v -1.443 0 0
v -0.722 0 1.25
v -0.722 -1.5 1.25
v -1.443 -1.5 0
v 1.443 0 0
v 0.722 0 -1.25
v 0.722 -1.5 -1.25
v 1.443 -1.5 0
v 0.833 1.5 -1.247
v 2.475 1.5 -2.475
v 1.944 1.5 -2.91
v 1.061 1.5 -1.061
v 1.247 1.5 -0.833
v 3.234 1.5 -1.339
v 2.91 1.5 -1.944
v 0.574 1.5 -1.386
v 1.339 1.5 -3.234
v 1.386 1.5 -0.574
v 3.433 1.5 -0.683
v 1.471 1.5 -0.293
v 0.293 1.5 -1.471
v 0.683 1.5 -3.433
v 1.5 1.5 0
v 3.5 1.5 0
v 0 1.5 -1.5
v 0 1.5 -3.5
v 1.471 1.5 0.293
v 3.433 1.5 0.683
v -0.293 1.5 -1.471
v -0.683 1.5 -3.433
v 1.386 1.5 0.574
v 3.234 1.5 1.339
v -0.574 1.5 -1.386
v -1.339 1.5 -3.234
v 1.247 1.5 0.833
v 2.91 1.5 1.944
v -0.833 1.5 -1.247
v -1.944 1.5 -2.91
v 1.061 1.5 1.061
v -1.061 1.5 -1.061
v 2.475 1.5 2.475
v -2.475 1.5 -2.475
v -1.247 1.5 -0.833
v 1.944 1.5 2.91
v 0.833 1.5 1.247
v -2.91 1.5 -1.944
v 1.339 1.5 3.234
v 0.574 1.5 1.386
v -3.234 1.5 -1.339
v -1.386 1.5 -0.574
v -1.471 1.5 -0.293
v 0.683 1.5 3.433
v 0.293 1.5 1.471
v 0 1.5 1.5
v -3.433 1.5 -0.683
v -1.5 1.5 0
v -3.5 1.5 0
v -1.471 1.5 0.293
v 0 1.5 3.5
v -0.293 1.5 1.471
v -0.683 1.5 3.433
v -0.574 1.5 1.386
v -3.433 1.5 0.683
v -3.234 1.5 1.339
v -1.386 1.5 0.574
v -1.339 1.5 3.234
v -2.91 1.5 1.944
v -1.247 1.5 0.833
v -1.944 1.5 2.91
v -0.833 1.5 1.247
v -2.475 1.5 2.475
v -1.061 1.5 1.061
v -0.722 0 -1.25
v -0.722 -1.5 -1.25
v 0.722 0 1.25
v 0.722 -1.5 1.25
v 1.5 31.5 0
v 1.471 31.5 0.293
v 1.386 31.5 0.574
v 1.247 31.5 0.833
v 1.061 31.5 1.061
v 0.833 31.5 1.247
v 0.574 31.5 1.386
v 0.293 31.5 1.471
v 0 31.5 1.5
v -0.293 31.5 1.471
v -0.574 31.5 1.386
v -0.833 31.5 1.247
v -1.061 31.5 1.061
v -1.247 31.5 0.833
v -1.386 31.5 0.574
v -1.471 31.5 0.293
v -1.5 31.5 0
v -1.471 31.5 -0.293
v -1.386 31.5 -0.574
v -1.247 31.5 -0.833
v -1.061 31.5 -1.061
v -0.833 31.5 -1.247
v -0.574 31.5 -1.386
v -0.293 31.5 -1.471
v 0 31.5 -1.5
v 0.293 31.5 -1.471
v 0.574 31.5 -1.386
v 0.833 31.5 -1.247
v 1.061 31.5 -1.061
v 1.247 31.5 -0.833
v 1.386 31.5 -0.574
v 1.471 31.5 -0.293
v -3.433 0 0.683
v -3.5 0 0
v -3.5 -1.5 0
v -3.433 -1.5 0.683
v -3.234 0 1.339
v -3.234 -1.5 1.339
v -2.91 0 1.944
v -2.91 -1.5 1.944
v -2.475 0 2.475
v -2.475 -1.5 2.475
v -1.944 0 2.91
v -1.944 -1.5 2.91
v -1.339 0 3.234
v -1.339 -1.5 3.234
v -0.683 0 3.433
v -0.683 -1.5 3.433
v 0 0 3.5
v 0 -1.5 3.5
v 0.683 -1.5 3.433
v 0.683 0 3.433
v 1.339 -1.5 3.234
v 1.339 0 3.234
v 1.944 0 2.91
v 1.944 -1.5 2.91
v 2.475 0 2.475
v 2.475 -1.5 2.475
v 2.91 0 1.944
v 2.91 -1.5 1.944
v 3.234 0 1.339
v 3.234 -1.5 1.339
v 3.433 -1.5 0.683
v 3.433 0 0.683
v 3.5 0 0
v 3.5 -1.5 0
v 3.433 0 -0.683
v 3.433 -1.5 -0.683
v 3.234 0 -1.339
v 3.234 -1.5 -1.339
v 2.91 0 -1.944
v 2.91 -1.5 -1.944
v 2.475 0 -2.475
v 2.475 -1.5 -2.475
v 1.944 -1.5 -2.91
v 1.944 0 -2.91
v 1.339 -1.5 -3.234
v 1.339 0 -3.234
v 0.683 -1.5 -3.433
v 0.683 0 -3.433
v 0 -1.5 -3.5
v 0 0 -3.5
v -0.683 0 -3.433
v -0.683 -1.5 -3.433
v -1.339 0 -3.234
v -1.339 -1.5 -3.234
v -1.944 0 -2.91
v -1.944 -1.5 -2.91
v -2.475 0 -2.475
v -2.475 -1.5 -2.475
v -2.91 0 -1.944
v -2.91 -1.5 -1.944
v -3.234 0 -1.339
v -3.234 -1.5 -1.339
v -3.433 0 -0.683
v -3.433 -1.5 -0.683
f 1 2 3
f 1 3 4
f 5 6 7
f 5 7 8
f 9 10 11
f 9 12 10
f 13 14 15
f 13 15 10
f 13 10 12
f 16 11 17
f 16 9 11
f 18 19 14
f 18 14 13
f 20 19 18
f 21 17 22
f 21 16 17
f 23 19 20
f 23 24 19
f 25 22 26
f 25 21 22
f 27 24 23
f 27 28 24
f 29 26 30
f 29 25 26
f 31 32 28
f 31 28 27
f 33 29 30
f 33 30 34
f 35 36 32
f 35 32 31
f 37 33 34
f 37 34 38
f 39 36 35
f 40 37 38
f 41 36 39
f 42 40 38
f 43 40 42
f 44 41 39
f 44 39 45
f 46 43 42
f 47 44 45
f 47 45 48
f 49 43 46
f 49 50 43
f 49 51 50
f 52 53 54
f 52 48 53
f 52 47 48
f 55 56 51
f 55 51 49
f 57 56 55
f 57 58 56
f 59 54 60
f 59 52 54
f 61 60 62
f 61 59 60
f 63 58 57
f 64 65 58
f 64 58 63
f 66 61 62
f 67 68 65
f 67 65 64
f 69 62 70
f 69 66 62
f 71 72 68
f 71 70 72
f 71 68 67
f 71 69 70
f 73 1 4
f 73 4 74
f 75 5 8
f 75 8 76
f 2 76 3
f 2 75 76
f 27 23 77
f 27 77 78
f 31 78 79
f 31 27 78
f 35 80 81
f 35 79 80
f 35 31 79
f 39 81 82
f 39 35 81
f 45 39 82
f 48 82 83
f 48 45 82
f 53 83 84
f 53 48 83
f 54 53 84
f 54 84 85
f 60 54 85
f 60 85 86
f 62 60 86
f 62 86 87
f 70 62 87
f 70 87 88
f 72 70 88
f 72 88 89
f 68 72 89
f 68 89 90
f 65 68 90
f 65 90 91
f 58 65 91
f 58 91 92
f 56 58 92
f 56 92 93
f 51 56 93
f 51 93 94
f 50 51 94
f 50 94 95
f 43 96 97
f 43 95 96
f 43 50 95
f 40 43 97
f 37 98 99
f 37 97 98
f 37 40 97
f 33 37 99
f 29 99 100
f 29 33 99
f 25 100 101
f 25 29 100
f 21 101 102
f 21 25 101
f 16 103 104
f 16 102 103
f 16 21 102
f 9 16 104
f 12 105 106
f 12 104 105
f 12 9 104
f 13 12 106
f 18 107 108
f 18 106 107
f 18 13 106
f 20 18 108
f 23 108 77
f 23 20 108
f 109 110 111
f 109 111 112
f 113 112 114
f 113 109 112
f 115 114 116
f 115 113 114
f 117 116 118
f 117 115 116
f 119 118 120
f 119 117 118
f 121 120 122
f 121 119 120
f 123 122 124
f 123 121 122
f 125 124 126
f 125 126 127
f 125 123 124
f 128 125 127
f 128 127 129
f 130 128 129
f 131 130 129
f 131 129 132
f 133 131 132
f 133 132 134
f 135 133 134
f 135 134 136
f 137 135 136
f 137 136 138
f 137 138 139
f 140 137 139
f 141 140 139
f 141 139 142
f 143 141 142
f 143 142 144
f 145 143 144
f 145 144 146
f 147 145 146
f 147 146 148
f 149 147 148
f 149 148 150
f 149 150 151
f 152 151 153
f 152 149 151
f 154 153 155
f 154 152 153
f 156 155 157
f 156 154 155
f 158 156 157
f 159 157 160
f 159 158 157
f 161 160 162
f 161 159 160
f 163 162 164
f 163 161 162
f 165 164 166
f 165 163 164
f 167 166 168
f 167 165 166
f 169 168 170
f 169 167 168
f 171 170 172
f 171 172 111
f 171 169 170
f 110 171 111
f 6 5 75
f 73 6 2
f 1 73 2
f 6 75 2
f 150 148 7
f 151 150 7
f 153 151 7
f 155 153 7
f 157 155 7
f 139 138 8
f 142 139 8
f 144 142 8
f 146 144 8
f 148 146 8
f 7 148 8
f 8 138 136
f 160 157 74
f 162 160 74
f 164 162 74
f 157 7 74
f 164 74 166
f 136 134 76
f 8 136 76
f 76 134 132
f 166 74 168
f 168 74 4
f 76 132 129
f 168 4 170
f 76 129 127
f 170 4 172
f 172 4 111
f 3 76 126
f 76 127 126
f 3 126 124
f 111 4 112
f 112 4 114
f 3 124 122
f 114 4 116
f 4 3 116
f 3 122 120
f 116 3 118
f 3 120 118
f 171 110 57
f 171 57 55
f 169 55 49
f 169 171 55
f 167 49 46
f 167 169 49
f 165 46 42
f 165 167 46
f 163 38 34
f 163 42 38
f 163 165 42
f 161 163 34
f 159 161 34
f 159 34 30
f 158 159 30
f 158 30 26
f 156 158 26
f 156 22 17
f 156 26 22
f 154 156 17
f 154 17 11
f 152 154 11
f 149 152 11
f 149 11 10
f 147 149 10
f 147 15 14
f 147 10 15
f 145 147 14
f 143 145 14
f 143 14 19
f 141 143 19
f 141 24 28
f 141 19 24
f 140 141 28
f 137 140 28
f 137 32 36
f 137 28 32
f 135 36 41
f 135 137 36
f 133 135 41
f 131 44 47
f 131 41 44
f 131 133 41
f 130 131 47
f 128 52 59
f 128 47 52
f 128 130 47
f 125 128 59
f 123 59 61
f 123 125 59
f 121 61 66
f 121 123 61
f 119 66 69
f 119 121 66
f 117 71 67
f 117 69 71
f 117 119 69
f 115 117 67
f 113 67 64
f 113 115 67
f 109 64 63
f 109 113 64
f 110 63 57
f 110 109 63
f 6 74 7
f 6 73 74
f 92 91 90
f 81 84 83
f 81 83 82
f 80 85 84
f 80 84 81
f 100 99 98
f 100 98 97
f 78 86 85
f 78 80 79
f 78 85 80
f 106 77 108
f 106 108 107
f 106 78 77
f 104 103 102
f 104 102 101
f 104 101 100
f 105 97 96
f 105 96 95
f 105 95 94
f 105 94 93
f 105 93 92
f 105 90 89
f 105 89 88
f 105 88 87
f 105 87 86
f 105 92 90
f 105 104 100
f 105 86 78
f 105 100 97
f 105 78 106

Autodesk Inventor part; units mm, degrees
ref_plane "YZ Plane" through (0, 0, 0) normal (1, 0, 0) x (0, 1, 0)
ref_plane "XZ Plane" through (0, 0, 0) normal (0, 1, 0) x (-1, 0, 0)
ref_plane "XY Plane" through (0, 0, 0) normal (0, 0, 1) x (1, 0, 0)
sketch "Szkic1" plane through (0, 0, 0) normal (0, 1, 0) x (-1, 0, 0)
  circle A0 centre (0, 0) radius 3.5
  line L0 (0.7217, 1.25) -> (1.4434, 0)
  line L1 (1.4434, 0) -> (0.7217, -1.25)
  line L2 (0.7217, -1.25) -> (-0.7217, -1.25)
  line L3 (-0.7217, -1.25) -> (-1.4434, 0)
  line L4 (-1.4434, 0) -> (-0.7217, 1.25)
  line L5 (-0.7217, 1.25) -> (0.7217, 1.25)
  circle A1 centre (0, 0) radius 1.5
  dimension "d0" = 7
  dimension "d1" = 2.5
  dimension "d2" = 3
extrude "Wyciągnięcie proste1" add sketch "Szkic1" along normal blind 1.5 contours A0 | L0 L1 L2 L3 L4 L5 | A1
extrude "Wyciągnięcie proste2" add sketch "Szkic1" against normal blind 1.5 contours A0 | A1
sketch "Szkic2" plane through (0, 1.5, 0) normal (0, 1, 0) x (1, 0, 0)
  circle A0 centre (0, 0) radius 1.5
  dimension "d7" = 3
extrude "Wyciągnięcie proste3" add sketch "Szkic2" along normal blind 30
thread "Gwint1" size "M3x0.5" class "6g" standard "ANSI Metric M Profile" length 65
properties part number "M3x30"
